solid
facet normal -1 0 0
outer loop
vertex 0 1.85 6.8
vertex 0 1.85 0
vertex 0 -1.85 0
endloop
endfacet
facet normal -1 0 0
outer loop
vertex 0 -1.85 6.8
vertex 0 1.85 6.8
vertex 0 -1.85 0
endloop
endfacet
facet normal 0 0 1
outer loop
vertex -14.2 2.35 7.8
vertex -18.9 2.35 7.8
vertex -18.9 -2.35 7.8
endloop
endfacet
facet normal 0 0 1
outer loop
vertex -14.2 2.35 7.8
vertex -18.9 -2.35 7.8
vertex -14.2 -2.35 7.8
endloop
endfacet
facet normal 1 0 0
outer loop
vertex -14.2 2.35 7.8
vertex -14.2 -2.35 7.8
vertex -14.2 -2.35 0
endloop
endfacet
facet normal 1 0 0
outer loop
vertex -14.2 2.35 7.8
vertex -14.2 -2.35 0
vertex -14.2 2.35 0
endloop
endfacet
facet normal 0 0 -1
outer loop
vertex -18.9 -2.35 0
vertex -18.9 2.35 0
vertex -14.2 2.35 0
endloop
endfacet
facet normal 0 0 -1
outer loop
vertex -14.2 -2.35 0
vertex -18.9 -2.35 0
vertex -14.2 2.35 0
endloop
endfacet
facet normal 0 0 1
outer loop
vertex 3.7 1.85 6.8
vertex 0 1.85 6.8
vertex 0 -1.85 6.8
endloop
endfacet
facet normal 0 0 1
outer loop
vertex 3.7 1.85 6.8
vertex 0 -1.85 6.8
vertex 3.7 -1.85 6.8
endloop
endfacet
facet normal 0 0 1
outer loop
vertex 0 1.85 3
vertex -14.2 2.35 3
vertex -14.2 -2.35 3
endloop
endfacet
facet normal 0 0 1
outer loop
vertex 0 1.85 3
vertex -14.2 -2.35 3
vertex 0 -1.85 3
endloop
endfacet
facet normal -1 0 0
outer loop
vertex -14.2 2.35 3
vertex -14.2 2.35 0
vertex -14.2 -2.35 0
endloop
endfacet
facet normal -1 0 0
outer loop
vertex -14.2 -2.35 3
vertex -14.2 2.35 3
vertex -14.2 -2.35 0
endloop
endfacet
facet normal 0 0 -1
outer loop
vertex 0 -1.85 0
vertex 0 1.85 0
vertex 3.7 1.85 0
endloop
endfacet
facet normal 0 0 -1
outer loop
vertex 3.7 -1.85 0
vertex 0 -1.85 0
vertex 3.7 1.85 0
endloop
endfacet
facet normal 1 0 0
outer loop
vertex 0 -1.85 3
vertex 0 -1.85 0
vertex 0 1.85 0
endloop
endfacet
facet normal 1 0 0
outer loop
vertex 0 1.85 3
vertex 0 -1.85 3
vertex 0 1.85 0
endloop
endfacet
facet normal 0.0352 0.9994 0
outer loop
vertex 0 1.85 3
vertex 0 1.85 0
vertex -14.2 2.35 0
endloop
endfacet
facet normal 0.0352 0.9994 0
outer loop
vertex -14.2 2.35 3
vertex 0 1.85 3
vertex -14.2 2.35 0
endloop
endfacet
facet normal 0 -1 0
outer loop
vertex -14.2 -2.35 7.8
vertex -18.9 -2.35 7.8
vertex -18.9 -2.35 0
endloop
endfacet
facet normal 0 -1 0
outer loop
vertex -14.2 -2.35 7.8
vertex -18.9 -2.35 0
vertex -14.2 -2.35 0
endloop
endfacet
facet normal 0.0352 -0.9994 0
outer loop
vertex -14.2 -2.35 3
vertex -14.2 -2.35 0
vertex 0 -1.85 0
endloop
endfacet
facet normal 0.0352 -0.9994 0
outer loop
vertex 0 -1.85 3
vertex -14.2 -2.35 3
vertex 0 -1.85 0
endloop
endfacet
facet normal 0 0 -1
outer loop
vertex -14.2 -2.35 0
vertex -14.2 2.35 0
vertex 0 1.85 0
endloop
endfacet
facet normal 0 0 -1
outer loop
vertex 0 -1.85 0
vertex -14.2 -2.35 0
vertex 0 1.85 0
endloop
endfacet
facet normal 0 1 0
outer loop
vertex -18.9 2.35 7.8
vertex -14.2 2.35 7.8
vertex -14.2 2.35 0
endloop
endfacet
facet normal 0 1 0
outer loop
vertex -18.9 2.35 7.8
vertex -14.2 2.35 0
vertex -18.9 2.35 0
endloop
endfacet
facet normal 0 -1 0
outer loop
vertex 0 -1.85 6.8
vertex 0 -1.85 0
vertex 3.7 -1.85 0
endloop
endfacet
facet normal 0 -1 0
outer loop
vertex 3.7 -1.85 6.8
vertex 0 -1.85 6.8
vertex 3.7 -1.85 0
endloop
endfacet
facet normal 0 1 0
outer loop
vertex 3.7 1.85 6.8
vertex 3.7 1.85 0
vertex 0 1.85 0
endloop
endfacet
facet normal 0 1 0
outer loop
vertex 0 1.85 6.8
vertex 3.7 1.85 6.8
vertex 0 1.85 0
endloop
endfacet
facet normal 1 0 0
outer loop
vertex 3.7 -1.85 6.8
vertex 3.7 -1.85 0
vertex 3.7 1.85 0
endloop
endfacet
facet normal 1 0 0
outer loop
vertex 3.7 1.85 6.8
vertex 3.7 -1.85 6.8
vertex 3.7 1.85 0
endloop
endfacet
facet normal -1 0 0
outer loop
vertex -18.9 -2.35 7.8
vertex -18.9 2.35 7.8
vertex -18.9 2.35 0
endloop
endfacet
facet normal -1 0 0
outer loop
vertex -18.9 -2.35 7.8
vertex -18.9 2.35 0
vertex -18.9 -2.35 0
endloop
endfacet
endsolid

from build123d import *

# Parameters (mm, degrees)
F1_DEPTH = 7.8
F2_DEPTH = 6.8
F3_DEPTH = 3


with BuildPart() as f1:
    # F0 (on Top) → F1 (new body)
    with BuildSketch(Plane.XY):
        Polygon((-14.2, 0), (-14.2, 2.35), (-18.9, 2.35), (-18.9, -2.35), (-14.2, -2.35), align=None)
    extrude(amount=F1_DEPTH)


with BuildPart() as f2:
    # F0 (on Top) → F2 (new body)
    with BuildSketch(Plane.XY):
        Polygon((3.7, 1.85), (0, 1.85), (0, 0), (0, -1.85), (3.7, -1.85), align=None)
    extrude(amount=F2_DEPTH)


with BuildPart() as f3:
    # F0 (on Top) → F3 (new body)
    with BuildSketch(Plane.XY):
        Polygon((0, 0), (0, 1.85), (-14.2, 2.35), (-14.2, 0), align=None)
        Polygon((0, -1.85), (0, 0), (-14.2, 0), (-14.2, -2.35), align=None)
    extrude(amount=F3_DEPTH)


solid = Compound([f1.part, f2.part, f3.part])
